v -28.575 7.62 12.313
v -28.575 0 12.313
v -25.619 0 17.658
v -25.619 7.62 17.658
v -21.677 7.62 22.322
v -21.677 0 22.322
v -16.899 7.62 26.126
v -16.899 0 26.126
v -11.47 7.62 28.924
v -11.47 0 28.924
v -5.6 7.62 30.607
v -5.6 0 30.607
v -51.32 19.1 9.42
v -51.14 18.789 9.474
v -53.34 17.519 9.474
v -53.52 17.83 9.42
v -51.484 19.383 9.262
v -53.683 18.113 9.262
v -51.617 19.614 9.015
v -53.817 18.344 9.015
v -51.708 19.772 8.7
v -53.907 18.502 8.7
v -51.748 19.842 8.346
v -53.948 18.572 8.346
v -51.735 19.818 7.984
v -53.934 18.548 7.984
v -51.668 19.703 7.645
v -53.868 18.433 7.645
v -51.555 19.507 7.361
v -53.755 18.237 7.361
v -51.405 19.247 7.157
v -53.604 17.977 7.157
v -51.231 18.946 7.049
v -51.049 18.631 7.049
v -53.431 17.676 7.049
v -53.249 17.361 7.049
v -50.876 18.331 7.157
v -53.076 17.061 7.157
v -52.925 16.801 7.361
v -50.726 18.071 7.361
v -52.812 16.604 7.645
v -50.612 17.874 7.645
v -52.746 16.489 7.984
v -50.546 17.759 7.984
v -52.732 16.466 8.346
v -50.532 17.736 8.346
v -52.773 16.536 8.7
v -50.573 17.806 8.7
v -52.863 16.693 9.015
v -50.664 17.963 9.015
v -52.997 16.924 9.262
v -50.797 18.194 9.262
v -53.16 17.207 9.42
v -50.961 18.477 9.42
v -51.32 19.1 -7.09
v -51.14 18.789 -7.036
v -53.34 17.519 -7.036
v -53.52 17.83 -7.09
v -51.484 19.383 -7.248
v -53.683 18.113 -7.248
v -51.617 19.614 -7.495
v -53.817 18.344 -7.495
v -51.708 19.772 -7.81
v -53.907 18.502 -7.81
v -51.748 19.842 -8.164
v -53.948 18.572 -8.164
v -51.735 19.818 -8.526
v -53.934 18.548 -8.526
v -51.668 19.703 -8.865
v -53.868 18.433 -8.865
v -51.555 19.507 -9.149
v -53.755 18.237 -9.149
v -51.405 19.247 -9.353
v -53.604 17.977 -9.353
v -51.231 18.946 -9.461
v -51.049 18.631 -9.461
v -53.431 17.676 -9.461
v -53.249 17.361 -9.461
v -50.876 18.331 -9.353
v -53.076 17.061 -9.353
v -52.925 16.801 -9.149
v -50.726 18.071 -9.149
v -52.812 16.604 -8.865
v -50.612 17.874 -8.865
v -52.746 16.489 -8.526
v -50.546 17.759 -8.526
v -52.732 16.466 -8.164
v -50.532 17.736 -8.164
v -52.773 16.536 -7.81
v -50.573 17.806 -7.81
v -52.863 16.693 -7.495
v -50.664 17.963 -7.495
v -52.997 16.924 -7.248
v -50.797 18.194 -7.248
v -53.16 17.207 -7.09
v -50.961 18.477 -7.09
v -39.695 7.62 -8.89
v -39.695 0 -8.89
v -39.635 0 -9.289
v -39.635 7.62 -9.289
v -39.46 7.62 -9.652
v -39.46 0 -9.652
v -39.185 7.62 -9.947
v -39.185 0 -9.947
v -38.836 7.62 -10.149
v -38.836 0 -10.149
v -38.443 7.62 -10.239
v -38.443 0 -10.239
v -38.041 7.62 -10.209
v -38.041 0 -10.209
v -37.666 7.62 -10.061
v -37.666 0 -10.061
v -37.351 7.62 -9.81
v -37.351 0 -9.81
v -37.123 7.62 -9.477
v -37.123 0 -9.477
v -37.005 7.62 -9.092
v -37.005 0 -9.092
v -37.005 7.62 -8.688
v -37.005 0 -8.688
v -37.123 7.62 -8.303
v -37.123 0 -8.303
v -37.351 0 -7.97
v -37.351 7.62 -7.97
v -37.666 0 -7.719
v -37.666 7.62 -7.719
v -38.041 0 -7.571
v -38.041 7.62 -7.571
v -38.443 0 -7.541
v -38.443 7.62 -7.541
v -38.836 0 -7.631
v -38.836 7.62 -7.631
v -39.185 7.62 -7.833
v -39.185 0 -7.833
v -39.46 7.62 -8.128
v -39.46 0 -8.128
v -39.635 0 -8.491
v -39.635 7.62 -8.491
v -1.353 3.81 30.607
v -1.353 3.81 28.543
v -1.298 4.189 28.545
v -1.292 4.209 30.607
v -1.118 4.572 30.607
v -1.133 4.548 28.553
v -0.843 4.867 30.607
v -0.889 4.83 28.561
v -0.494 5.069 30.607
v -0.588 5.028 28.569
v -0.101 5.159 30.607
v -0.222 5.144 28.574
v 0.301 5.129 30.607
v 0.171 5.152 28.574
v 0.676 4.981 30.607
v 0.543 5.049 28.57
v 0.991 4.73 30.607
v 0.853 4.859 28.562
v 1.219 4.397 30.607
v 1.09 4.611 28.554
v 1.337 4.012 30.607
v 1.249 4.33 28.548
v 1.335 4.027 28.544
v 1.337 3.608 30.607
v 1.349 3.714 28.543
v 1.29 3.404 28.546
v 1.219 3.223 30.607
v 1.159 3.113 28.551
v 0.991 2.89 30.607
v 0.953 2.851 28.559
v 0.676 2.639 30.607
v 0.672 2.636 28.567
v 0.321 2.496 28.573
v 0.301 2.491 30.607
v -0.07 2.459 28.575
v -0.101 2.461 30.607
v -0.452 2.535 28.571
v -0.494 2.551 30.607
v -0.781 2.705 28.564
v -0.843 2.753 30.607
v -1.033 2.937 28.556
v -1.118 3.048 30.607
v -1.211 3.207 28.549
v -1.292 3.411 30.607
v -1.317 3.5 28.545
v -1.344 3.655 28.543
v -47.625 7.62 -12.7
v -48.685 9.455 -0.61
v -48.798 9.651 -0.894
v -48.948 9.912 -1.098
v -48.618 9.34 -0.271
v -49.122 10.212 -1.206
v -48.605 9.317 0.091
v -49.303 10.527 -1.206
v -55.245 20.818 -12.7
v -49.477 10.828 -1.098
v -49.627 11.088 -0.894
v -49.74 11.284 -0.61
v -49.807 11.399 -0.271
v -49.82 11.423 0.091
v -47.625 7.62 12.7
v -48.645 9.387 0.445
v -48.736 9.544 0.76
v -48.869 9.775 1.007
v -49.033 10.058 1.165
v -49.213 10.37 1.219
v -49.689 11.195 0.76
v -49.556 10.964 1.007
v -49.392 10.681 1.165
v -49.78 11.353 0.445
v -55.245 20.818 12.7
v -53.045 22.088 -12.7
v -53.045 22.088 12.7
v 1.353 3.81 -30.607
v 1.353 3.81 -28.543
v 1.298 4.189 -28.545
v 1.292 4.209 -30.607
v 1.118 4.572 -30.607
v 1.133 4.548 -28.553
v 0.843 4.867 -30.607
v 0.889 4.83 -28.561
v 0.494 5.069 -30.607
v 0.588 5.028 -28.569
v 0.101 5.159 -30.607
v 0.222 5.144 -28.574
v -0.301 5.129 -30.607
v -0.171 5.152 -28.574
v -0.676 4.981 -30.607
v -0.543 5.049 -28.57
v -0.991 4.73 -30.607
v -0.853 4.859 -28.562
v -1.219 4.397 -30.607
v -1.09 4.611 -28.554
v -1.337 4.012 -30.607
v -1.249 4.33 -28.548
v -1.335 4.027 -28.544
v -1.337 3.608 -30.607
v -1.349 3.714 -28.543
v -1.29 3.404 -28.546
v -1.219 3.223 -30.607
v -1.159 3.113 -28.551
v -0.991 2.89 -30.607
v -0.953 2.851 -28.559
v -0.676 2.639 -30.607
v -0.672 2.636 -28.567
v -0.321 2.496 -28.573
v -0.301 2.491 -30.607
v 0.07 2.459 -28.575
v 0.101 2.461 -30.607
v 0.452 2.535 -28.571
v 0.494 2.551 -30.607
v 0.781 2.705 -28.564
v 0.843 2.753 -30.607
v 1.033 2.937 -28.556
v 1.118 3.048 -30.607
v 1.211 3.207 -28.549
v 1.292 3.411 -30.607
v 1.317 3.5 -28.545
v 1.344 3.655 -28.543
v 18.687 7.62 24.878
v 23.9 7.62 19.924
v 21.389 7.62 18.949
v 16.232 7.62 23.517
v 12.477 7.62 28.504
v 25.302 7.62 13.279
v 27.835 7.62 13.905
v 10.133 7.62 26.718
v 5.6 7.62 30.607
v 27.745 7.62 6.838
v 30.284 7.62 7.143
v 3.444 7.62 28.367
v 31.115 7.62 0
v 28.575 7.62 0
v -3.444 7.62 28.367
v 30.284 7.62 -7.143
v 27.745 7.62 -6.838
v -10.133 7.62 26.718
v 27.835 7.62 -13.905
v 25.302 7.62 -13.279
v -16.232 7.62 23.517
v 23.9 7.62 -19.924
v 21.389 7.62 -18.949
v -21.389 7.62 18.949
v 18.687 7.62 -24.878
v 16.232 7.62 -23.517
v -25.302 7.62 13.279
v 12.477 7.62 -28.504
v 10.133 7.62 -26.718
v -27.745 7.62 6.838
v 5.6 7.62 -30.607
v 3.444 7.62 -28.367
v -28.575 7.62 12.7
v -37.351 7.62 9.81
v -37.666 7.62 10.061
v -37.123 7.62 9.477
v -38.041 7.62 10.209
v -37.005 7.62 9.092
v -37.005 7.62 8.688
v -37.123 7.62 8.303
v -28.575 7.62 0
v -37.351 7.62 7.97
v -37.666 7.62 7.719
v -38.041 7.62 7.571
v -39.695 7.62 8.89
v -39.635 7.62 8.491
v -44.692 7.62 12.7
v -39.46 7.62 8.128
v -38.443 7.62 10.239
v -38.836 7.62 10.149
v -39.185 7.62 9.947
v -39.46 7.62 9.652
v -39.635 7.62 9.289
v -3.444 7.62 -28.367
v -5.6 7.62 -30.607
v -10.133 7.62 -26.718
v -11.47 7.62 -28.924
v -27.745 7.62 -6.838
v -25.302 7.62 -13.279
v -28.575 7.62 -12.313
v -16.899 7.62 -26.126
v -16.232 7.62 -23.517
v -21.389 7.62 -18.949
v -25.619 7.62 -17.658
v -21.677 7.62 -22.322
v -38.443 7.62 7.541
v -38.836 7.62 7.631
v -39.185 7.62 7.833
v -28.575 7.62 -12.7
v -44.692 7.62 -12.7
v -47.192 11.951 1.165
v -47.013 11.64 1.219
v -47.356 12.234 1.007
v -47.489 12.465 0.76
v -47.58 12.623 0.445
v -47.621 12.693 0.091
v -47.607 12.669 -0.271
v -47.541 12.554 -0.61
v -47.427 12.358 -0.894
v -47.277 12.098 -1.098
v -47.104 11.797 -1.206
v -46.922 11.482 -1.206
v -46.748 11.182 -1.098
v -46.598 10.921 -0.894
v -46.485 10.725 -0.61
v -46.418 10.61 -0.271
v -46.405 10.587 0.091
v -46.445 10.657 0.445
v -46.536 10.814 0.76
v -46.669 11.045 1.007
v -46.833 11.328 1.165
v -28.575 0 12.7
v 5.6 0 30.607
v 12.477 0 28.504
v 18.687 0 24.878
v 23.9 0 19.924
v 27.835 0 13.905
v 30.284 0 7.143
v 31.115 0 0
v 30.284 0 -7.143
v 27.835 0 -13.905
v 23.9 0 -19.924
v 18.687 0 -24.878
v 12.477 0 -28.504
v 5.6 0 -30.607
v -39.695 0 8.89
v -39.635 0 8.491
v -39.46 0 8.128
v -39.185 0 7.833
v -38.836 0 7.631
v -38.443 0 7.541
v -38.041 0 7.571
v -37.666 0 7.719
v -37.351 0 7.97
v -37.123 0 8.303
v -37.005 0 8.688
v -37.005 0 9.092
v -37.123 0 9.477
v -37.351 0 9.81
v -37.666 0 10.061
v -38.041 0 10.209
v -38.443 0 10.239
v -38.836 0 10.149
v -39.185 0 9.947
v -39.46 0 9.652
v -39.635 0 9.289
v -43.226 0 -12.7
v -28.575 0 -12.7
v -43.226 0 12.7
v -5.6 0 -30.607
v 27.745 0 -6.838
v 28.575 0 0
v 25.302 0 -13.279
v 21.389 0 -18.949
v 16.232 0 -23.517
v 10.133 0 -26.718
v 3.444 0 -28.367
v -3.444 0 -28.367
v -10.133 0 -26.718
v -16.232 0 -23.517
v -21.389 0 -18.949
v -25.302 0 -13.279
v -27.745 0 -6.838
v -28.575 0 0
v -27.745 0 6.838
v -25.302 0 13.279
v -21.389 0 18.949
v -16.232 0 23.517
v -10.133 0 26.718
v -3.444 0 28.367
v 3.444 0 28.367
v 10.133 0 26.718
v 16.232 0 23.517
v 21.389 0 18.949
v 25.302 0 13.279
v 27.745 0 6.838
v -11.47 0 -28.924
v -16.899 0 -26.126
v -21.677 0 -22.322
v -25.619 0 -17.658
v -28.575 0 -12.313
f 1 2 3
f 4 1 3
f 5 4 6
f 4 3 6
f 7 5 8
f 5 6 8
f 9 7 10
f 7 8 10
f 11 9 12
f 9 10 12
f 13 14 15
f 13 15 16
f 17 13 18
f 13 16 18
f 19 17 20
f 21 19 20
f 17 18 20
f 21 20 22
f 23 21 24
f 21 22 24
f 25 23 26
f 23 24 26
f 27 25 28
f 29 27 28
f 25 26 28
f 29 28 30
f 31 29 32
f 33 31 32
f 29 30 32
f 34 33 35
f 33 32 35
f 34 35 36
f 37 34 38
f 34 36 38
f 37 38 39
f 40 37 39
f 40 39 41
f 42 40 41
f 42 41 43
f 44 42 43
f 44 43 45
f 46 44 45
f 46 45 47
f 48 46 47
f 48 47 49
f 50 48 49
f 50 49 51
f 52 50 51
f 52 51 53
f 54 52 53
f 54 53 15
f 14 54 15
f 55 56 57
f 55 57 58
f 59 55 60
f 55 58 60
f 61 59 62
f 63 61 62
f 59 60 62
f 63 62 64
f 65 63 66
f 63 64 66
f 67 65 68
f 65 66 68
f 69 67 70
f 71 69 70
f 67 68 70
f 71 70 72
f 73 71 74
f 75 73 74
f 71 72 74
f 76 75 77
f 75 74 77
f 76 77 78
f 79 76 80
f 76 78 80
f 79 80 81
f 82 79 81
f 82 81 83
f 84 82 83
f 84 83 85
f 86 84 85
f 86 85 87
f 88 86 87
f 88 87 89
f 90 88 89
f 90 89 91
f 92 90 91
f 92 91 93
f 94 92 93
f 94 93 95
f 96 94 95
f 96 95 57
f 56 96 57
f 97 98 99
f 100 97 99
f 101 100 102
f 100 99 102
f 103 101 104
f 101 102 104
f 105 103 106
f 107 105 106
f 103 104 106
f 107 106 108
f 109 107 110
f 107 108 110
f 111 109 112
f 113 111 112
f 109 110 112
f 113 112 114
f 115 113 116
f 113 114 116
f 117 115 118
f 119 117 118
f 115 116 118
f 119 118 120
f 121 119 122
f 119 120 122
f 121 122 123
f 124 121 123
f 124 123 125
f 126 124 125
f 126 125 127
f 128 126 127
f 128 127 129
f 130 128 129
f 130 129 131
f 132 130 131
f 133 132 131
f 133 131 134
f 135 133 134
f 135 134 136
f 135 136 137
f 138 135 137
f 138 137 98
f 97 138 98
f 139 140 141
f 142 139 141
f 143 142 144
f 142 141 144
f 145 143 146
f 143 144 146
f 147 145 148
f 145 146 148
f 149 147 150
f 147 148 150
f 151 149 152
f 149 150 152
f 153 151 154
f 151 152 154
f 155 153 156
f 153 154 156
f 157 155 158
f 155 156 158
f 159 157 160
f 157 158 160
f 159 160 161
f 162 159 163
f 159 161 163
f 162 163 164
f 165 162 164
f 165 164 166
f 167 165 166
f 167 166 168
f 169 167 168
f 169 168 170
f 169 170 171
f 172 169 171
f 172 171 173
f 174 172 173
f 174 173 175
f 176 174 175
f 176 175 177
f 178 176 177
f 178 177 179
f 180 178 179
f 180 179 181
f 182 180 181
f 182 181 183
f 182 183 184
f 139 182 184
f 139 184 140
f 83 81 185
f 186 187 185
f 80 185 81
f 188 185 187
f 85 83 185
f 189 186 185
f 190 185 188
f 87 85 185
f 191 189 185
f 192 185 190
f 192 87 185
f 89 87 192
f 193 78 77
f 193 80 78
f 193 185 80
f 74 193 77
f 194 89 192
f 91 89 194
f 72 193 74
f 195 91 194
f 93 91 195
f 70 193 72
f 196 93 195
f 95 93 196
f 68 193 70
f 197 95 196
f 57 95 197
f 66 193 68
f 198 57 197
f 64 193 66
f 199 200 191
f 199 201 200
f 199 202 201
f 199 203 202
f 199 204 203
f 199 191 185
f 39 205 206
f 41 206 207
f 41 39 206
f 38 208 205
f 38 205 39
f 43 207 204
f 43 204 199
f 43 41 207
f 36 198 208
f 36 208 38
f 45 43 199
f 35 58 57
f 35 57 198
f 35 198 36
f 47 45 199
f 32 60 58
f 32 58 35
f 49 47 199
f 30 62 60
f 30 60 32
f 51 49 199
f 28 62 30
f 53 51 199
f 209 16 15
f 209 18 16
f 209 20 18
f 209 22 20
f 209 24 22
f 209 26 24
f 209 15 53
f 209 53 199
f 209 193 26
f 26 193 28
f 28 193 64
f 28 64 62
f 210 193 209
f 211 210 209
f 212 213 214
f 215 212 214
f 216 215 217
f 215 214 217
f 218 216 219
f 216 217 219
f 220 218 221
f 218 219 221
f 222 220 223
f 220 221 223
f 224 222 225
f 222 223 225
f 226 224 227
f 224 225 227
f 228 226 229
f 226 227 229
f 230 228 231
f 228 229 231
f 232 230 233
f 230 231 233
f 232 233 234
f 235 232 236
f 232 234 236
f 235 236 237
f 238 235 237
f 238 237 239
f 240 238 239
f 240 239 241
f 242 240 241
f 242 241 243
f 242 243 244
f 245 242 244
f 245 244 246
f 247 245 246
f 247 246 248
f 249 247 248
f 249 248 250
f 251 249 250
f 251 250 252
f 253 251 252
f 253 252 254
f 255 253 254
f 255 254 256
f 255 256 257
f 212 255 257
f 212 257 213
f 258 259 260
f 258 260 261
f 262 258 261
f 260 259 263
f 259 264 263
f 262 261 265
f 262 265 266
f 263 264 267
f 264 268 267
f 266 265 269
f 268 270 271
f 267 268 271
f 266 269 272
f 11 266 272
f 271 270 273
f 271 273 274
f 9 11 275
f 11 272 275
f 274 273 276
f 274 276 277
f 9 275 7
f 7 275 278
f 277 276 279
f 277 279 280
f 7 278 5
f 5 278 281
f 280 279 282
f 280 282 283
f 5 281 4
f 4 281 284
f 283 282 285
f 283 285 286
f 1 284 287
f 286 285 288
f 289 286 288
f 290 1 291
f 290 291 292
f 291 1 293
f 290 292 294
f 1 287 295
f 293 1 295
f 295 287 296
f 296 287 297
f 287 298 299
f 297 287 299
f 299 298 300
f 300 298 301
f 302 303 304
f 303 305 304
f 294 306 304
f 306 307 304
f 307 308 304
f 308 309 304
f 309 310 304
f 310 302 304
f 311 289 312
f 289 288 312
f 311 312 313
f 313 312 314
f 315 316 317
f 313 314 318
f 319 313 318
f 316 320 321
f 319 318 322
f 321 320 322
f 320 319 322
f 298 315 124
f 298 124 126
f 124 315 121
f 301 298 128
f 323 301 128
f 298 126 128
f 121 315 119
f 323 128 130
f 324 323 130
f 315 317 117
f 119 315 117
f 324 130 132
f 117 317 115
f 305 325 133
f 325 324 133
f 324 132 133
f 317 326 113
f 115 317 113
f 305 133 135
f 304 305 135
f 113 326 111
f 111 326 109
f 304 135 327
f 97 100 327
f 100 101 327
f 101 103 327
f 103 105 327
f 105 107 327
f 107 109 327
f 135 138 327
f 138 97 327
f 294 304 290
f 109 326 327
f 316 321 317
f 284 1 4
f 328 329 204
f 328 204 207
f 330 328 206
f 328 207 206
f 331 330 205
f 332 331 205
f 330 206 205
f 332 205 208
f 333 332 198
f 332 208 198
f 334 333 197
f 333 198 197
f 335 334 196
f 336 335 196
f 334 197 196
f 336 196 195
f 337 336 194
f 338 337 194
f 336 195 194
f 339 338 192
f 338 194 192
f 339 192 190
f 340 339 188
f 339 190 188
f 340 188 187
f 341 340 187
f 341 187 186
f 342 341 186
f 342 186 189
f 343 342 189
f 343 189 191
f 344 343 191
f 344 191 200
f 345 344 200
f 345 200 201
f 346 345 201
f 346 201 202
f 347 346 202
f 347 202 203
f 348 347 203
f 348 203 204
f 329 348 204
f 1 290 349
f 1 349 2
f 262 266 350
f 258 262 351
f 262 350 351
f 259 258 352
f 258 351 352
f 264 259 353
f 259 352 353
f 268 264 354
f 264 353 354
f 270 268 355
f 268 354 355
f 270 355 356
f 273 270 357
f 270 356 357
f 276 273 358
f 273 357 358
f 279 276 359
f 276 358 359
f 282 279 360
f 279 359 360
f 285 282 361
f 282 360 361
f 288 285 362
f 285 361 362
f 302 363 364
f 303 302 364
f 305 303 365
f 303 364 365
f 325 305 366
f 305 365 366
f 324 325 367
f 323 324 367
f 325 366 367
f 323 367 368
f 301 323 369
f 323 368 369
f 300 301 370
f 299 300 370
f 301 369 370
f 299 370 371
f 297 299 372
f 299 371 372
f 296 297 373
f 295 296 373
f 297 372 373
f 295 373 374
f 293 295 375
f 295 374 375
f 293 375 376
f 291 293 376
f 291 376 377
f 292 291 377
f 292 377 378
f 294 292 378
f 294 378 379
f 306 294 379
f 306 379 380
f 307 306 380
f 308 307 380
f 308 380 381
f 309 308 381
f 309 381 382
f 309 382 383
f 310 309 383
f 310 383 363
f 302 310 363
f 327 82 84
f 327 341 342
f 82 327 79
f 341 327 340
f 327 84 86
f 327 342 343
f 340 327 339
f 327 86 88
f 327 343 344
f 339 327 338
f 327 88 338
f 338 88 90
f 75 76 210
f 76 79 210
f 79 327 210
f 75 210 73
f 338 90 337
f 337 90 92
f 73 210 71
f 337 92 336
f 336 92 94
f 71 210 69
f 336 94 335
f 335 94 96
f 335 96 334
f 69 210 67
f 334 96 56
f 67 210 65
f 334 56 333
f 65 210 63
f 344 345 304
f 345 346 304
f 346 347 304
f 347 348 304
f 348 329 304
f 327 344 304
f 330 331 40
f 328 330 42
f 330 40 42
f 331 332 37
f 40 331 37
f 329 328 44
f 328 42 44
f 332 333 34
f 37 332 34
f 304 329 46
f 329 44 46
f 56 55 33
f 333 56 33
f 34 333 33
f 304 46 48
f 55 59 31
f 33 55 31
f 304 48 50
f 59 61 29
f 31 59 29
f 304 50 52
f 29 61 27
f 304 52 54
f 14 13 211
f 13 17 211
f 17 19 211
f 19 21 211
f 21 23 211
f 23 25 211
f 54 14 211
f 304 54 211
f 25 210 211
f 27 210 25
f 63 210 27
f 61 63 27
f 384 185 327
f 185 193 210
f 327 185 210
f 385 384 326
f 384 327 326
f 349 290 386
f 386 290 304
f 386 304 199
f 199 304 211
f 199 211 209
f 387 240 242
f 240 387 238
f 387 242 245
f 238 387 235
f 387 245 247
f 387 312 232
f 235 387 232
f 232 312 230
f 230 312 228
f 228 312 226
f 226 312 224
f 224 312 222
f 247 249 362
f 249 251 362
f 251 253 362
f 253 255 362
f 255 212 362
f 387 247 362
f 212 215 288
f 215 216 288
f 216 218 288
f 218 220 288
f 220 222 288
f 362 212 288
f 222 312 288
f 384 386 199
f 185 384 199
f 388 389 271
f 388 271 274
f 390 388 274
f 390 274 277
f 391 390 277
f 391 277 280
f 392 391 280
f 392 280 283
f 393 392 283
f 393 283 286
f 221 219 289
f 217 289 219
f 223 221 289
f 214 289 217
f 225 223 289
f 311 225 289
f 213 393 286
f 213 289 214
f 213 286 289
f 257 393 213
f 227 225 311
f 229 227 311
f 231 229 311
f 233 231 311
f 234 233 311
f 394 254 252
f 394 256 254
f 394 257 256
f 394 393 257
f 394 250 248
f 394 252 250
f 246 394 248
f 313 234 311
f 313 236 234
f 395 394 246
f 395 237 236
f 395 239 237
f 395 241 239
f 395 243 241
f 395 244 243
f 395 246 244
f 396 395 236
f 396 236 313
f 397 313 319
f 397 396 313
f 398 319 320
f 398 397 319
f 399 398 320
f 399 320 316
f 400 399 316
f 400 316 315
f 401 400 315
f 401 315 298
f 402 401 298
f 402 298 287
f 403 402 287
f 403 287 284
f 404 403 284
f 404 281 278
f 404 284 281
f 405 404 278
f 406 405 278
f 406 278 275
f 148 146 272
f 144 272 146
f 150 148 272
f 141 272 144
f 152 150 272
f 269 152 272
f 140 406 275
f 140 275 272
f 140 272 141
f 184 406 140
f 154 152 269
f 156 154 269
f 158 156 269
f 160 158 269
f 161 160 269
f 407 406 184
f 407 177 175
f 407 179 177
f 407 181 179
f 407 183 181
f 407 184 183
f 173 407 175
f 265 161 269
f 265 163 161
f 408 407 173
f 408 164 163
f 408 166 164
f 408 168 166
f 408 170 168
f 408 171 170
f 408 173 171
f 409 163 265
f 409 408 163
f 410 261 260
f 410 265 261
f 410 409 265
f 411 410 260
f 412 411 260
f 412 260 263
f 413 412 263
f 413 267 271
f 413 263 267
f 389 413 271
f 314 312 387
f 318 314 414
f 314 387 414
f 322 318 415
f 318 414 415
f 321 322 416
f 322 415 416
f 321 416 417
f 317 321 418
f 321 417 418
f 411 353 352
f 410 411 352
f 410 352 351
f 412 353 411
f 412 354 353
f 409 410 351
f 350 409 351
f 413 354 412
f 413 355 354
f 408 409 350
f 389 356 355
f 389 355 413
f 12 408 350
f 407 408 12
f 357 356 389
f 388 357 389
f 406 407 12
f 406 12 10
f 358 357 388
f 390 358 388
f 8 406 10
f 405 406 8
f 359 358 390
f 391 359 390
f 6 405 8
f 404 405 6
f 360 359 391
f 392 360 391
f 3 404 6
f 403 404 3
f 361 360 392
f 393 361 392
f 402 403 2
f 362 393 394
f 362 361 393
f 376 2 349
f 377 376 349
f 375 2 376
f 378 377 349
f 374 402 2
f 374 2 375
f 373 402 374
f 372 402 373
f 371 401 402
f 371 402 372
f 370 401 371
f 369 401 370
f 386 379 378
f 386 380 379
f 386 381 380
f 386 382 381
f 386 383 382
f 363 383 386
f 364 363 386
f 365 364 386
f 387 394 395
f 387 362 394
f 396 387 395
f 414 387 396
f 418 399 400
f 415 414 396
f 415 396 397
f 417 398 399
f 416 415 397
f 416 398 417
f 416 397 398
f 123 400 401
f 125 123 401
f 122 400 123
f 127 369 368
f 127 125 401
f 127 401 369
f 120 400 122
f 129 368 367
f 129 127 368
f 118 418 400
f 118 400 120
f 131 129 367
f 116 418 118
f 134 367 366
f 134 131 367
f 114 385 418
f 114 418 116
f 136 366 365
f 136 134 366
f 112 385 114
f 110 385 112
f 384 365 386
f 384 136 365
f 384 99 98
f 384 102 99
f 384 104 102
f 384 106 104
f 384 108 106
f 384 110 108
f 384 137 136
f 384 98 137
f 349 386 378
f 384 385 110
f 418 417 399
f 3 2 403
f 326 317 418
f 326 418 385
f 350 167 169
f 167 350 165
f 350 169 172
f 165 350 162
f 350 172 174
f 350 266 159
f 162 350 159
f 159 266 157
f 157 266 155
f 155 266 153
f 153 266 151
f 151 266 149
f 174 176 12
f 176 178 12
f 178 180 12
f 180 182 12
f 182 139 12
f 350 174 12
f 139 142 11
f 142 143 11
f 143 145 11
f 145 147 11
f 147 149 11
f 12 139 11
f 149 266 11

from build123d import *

# Parameters (mm, degrees)
SKETCH1_R                      = 31.115
SKETCH1_R_2                    = 28.575
EXTRUDE_THIN1_DEPTH            = 7.62
BOSS_EXTRUDE1_DEPTH            = 7.62
CUT_EXTRUDE1_REACH             = 67.161
CUT_EXTRUDE1_DIRECTION_2_DEPTH = 66.161025544
SKETCH4_W                      = 25.4
SKETCH4_H                      = 24.038818103
BOSS_EXTRUDE2_DEPTH            = 2.54
F_2_CLEARANCE_HOLE1_D          = 2.4384
F_6_32_TAPPED_HOLE1_D          = 2.7051
SKETCH9_W                      = 20.32
SKETCH9_H                      = 0.508
CUT_EXTRUDE2_DEPTH             = 66.034474296
CUT_EXTRUDE3_DEPTH             = 66.034474296
F_6_32_TAPPED_HOLE2_D          = 2.7051
F_6_32_TAPPED_HOLE2_DEPTH      = 11.176
F_6_32_TAPPED_HOLE2_TIP        = 0.81269403
F_6_32_TAPPED_HOLE3_D          = 2.7051
F_6_32_TAPPED_HOLE3_DEPTH      = 11.176
F_6_32_TAPPED_HOLE3_TIP        = 0.81269403


with BuildPart() as part:
    # Sketch1 → Extrude-Thin1 (new body)
    with BuildSketch(Plane(origin=(0, 0, 0), x_dir=(1, 0, 0), z_dir=(0, 1, 0))):
        Circle(SKETCH1_R)
        Circle(SKETCH1_R_2, mode=Mode.SUBTRACT)
    extrude(amount=EXTRUDE_THIN1_DEPTH)

    # Sketch2 → Boss-Extrude1 (add)
    with BuildSketch(Plane(origin=(0, 7.62, 0), x_dir=(1, 0, 0), z_dir=(0, 1, 0))):
        Polygon((-28.575, 0), (-28.575, -12.7), (-47.625, -12.7), (-47.625, 12.7), (-28.575, 12.7), align=None)
    extrude(amount=-BOSS_EXTRUDE1_DEPTH)

    # Sketch3 → Cut-Extrude1 (cut, up to next)
    with BuildSketch(Plane.XY.offset(12.7), mode=Mode.PRIVATE) as cut_extrude1_sk1:
        Polygon((-47.625, 0), (-43.225590949, 0), (-47.625, 7.62), align=None)
    cut_extrude1_tool1 = extrude(cut_extrude1_sk1.sketch, amount=-CUT_EXTRUDE1_REACH, mode=Mode.PRIVATE) & part.part
    add(cut_extrude1_tool1.solids().sort_by_distance((-46.15853, 2.54, 12.7))[0], mode=Mode.SUBTRACT)

    # Sketch3 → Cut-Extrude1 direction 2 (cut)
    with BuildSketch(Plane.XY.offset(12.7)):
        Polygon((-47.625, 0), (-43.225590949, 0), (-47.625, 7.62), align=None)
    extrude(amount=CUT_EXTRUDE1_DIRECTION_2_DEPTH, mode=Mode.SUBTRACT)

    # Sketch4 → Boss-Extrude2 (add)
    with BuildSketch(Plane(origin=(-32.419193212, -18.717229928, 0), x_dir=(0, 0, 1), z_dir=(-0.8660254037844413, -0.4999999999999954, 0))):
        with Locations((0, 33.632204526)):
            Rectangle(SKETCH4_W, SKETCH4_H)
    extrude(amount=-BOSS_EXTRUDE2_DEPTH)

    # #2 Clearance Hole1 (through all)
    with Locations(Plane(origin=(-30.219488686, -17.447229928, 0), x_dir=(0, 0, -1), z_dir=(0.8660254037844413, 0.4999999999999956, 0))):
        with Locations((-8.255, 41.841613577), (8.255, 41.841613577), (0, 33.586613577)):
            Hole(F_2_CLEARANCE_HOLE1_D / 2)

    # #6-32 Tapped Hole1 (through all)
    with Locations(Plane(origin=(0, 7.62, 0), x_dir=(1, 0, 0), z_dir=(0, 1, 0))):
        with Locations((-38.342060633, -8.89), (-38.342060633, 8.89)):
            Hole(F_6_32_TAPPED_HOLE1_D / 2)

    # Sketch9 → Cut-Extrude2 (cut, through all)
    with BuildSketch(Plane(origin=(0, 7.62, 0), x_dir=(1, 0, 0), z_dir=(0, 1, 0))):
        with Locations((0, 30.861)):
            Rectangle(SKETCH9_W, SKETCH9_H)
    extrude(amount=-CUT_EXTRUDE2_DEPTH, mode=Mode.SUBTRACT)

    # Sketch10 → Cut-Extrude3 (cut, through all)
    with BuildSketch(Plane(origin=(0, 7.62, 0), x_dir=(1, 0, 0), z_dir=(0, 1, 0))):
        Polygon((0, -31.115), (14.742648062, -31.115), (14.742648062, -30.607), (-16.079982159, -30.607), (-16.079982159, -31.115), align=None)
    extrude(amount=-CUT_EXTRUDE3_DEPTH, mode=Mode.SUBTRACT)

    # #6-32 Tapped Hole2
    with Locations(Plane(origin=(0, 0, -30.607), x_dir=(-1, 0, 0), z_dir=(0, 0, -1))):
        with Locations((0, 3.81)):
            Hole(F_6_32_TAPPED_HOLE2_D / 2, depth=F_6_32_TAPPED_HOLE2_DEPTH)
            with Locations((0, 0, -(F_6_32_TAPPED_HOLE2_DEPTH + F_6_32_TAPPED_HOLE2_TIP / 2))):  # 118° drill point
                Cone(0, F_6_32_TAPPED_HOLE2_D / 2, F_6_32_TAPPED_HOLE2_TIP, mode=Mode.SUBTRACT)

    # #6-32 Tapped Hole3
    with Locations(Plane.XY.offset(30.607)):
        with Locations((0, 3.81)):
            Hole(F_6_32_TAPPED_HOLE3_D / 2, depth=F_6_32_TAPPED_HOLE3_DEPTH)
            with Locations((0, 0, -(F_6_32_TAPPED_HOLE3_DEPTH + F_6_32_TAPPED_HOLE3_TIP / 2))):  # 118° drill point
                Cone(0, F_6_32_TAPPED_HOLE3_D / 2, F_6_32_TAPPED_HOLE3_TIP, mode=Mode.SUBTRACT)


solid = part.part
